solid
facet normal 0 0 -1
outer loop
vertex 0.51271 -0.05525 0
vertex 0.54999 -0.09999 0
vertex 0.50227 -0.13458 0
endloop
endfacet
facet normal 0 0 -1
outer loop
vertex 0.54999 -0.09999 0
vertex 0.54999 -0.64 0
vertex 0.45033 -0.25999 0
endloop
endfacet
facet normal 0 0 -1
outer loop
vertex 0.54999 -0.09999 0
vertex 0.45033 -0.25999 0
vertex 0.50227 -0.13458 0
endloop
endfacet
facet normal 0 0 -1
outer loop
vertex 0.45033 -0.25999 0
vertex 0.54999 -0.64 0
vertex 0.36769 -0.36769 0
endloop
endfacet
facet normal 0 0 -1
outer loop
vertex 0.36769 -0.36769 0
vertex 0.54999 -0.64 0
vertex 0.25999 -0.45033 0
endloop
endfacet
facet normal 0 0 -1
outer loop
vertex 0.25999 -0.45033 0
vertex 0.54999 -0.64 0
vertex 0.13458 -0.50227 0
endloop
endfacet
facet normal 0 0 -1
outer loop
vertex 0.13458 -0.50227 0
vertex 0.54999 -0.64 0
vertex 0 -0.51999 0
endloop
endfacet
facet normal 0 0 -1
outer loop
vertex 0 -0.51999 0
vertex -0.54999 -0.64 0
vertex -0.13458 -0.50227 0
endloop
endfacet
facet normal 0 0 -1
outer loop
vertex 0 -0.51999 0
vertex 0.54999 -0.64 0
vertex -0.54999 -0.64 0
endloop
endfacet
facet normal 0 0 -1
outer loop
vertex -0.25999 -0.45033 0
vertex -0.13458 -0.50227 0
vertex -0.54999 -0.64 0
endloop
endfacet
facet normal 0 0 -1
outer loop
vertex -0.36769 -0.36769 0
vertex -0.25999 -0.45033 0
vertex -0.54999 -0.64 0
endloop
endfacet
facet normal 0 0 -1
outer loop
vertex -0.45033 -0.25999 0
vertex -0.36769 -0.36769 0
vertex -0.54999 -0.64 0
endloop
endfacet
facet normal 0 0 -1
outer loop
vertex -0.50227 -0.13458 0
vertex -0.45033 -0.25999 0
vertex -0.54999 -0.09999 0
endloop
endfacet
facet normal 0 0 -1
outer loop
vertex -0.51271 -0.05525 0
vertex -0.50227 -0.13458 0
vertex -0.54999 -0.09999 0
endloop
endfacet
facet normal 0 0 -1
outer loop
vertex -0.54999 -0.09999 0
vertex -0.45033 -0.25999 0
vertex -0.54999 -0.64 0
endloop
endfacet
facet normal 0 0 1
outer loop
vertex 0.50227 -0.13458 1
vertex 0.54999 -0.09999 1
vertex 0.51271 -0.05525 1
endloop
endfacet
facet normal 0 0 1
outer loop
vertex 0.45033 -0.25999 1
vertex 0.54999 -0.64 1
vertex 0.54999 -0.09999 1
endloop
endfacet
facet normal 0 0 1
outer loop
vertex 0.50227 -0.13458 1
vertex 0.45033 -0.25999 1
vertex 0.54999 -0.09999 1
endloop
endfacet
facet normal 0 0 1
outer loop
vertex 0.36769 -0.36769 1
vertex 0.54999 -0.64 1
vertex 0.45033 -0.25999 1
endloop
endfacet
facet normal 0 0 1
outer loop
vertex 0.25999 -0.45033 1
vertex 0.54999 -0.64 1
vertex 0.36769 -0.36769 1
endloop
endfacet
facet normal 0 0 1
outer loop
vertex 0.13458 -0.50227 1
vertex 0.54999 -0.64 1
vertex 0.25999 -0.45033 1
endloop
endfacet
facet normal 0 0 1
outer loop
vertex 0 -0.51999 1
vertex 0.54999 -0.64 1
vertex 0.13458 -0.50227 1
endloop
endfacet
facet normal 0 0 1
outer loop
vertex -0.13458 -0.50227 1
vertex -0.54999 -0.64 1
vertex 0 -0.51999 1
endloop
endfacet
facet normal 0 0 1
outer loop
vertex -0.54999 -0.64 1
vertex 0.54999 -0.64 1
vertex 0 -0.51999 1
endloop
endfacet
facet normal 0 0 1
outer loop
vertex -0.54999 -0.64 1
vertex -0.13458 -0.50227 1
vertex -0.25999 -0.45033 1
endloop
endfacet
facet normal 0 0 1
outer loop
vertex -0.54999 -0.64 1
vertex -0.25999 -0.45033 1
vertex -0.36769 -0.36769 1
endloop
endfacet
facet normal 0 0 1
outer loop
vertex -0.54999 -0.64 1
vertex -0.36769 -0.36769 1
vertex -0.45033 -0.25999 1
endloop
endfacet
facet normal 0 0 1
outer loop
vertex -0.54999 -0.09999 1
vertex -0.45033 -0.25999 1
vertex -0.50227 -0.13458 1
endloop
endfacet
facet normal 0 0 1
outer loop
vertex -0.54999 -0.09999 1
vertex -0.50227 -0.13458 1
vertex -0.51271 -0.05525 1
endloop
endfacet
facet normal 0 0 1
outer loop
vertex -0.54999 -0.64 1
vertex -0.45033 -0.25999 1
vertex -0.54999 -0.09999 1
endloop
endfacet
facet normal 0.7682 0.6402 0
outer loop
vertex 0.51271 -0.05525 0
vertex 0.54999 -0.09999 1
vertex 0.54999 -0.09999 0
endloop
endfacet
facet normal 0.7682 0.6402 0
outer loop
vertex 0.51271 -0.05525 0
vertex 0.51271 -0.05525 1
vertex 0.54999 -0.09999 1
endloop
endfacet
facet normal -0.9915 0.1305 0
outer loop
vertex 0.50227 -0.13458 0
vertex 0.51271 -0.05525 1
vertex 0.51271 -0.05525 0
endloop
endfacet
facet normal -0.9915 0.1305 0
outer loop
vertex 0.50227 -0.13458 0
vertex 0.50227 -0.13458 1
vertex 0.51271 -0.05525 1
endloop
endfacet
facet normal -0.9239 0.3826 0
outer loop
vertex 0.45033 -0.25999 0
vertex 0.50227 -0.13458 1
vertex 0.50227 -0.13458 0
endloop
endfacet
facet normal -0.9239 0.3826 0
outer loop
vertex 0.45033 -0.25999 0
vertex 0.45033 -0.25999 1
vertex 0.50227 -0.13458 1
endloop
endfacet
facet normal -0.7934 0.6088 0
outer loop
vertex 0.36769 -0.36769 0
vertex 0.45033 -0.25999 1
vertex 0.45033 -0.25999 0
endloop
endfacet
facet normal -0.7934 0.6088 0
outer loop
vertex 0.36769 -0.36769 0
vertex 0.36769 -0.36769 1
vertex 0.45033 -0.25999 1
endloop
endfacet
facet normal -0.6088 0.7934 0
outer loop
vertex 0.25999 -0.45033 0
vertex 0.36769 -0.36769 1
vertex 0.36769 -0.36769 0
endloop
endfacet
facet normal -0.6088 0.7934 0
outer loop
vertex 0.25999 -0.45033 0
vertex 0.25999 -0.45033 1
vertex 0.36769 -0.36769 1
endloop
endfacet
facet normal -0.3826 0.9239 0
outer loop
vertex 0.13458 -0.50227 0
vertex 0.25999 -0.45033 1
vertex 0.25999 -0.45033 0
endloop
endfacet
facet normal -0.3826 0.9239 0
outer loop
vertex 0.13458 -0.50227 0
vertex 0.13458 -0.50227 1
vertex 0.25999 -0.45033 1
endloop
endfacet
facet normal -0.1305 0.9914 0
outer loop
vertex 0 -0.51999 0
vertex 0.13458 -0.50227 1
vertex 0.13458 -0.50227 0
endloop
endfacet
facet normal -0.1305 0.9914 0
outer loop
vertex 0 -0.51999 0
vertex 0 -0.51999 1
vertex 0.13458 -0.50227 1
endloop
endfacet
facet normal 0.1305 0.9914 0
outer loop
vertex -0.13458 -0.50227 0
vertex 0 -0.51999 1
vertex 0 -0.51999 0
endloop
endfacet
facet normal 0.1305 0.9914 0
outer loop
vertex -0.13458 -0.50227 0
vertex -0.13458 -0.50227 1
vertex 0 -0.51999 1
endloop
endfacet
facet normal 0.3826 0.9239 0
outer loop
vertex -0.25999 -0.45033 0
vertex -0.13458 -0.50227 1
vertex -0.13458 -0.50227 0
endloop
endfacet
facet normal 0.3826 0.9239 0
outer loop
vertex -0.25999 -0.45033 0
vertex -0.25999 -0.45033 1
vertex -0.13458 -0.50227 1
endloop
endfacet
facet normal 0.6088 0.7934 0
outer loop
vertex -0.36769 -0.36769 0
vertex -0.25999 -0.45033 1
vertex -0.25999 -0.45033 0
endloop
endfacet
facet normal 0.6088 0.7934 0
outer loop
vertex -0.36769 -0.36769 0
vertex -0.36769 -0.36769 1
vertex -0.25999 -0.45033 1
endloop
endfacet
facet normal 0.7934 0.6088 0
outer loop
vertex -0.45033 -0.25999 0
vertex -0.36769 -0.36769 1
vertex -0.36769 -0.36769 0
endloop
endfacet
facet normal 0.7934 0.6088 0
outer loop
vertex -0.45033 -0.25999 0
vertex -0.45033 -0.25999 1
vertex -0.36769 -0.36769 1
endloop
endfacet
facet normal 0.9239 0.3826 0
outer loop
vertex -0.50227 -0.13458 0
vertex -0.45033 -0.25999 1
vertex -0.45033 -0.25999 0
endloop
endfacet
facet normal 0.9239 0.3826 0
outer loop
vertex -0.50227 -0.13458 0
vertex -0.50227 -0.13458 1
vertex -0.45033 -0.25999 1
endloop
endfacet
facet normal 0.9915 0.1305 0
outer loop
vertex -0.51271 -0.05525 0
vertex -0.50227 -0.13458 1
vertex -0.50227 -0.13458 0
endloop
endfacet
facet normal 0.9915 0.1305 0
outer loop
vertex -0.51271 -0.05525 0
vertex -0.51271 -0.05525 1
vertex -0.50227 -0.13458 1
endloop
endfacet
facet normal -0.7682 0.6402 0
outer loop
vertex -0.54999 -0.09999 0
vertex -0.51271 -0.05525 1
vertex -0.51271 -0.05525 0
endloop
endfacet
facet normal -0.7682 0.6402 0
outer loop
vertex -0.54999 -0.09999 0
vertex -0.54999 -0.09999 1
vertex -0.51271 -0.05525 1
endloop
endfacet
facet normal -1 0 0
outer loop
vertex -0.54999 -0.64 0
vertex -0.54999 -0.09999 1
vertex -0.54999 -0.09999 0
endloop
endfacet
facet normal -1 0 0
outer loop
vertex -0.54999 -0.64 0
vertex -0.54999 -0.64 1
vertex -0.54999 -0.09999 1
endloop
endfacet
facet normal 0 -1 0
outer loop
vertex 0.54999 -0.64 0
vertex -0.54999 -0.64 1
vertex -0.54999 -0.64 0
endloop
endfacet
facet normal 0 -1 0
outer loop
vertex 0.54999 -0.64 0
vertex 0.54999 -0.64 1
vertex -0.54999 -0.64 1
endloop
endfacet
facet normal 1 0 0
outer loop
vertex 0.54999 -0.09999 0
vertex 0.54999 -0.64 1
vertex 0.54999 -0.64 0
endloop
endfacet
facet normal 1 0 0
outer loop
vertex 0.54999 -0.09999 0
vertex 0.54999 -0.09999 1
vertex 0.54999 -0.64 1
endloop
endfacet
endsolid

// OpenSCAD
// Carousel Autoloader 0.2.23 - feed trough (laadgoot) profile on unit calibre, extruded along z over 1.
// The round axis is at (0,0). Outer width 1.1 d, a groove of radius 0.52 d, a floor of 0.12 d and a
// bottom flange; the walls end at half height so the round stays visible in the trough.
linear_extrude(height = 1)
  difference() {
    polygon([[-0.55,-0.64],[0.55,-0.64],[0.55,-0.10],[0.50,-0.04],[-0.50,-0.04],[-0.55,-0.10]]);
    circle(r = 0.52, $fn = 24);
  }
